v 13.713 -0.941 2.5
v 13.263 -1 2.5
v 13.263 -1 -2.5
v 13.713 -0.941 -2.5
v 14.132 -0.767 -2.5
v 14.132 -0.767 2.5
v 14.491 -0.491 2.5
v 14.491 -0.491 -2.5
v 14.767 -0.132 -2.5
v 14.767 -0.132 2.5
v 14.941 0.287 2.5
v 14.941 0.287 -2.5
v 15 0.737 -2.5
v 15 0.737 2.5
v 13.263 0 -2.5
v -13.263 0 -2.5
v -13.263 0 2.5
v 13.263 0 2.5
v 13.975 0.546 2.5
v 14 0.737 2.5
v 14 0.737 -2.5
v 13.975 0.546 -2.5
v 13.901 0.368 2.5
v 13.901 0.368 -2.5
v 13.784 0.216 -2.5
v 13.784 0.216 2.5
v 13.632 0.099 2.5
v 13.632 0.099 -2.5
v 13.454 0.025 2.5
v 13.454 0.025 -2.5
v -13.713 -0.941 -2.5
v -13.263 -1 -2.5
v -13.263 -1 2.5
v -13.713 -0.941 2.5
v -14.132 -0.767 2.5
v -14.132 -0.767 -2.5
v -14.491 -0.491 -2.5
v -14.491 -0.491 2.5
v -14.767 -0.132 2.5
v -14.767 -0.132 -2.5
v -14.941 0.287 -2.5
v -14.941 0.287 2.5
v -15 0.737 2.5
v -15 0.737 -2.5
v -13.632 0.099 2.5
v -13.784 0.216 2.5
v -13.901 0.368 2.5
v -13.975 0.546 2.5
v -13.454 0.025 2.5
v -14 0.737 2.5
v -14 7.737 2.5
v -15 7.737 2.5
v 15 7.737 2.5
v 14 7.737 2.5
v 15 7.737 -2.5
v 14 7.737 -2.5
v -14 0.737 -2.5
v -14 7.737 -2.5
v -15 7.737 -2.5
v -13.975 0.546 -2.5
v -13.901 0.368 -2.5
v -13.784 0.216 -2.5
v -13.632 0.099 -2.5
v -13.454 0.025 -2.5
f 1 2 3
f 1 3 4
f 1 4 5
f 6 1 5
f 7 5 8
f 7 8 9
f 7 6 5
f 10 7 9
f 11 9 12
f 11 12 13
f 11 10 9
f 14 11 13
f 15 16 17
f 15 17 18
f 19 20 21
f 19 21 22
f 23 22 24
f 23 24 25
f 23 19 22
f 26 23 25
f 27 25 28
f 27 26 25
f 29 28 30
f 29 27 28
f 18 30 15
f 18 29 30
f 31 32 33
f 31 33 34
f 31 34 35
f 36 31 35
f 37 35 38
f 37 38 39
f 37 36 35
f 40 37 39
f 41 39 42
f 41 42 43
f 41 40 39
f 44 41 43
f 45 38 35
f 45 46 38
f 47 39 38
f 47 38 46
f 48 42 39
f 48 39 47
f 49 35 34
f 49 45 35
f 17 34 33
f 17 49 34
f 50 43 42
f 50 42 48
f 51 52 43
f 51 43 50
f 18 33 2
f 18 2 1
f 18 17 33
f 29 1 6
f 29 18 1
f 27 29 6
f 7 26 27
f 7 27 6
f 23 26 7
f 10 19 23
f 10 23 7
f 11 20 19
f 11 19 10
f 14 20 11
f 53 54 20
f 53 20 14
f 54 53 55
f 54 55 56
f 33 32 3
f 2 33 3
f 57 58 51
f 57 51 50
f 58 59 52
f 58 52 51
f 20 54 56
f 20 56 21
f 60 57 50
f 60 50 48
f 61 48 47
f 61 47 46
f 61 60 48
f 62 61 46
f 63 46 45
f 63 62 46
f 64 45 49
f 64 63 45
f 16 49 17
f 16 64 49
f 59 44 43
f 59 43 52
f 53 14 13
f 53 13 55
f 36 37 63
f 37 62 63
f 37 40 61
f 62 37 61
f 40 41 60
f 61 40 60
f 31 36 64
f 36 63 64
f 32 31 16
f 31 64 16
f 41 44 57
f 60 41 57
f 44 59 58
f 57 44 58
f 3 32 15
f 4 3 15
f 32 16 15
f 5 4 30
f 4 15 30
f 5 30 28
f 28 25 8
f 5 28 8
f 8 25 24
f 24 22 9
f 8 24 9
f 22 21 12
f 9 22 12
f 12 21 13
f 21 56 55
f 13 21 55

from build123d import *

# Parameters (mm, degrees)
SKETCH1_W                    = 30
SKETCH1_H                    = 5
BASE_FLANGE1_DEPTH           = 1
EDGE_FLANGE1_STRIP_W         = 5.4732
EDGE_FLANGE1_STRIP_H         = 1
EDGE_FLANGE1_STRIP_CUT_DEPTH = 5
EDGE_FLANGE1_DEPTH           = 5
EDGE_FLANGE2_STRIP_W         = 5.4732
EDGE_FLANGE2_STRIP_H         = 1
EDGE_FLANGE2_STRIP_CUT_DEPTH = 5
EDGE_FLANGE2_DEPTH           = 5


# Sheet-metal steps are written as plain solids
with BuildPart() as part:
    # Sketch1 → Base-Flange1 (new body)
    with BuildSketch(Plane(origin=(0, 0, 0), x_dir=(1, 0, 0), z_dir=(0, 1, 0))):
        Rectangle(SKETCH1_W, SKETCH1_H)
    extrude(amount=-BASE_FLANGE1_DEPTH)

    # Edge-Flange1 strip (across the edge) → Edge-Flange1 strip cut (cut)
    with BuildSketch(Plane(origin=(-15, 0, -2.5), x_dir=(1, 0, 0), z_dir=(0, 0, 1))):
        with Locations((-1, -0.5)):
            Rectangle(EDGE_FLANGE1_STRIP_W, EDGE_FLANGE1_STRIP_H)
    extrude(amount=EDGE_FLANGE1_STRIP_CUT_DEPTH, mode=Mode.SUBTRACT)

    # Edge-Flange1 section (across the edge) → Edge-Flange1 (add)
    with BuildSketch(Plane(origin=(-15, 0, -2.5), x_dir=(1, 0, 0), z_dir=(0, 0, 1))):
        with BuildLine():
            Line((0, 0.7366), (0, 7.7366))
            Line((0, 7.7366), (1, 7.7366))
            Line((1, 7.7366), (1, 0.7366))
            ThreePointArc((1, 0.7366), (1.215745145, 0.215745145), (1.7366, 0))
            Line((1.7366, 0), (1.7366, -1))
            ThreePointArc((1.7366, -1), (0.508638364, -0.491361636), (0, 0.7366))
        make_face()
    extrude(amount=EDGE_FLANGE1_DEPTH)

    # Edge-Flange2 strip (across the edge) → Edge-Flange2 strip cut (cut)
    with BuildSketch(Plane(origin=(15, 0, 2.5), x_dir=(-1, 0, 0), z_dir=(0, 0, -1))):
        with Locations((-1, -0.5)):
            Rectangle(EDGE_FLANGE2_STRIP_W, EDGE_FLANGE2_STRIP_H)
    extrude(amount=EDGE_FLANGE2_STRIP_CUT_DEPTH, mode=Mode.SUBTRACT)

    # Edge-Flange2 section (across the edge) → Edge-Flange2 (add)
    with BuildSketch(Plane(origin=(15, 0, 2.5), x_dir=(-1, 0, 0), z_dir=(0, 0, -1))):
        with BuildLine():
            Line((0, 0.7366), (0, 7.7366))
            Line((0, 7.7366), (1, 7.7366))
            Line((1, 7.7366), (1, 0.7366))
            ThreePointArc((1, 0.7366), (1.215745145, 0.215745145), (1.7366, 0))
            Line((1.7366, 0), (1.7366, -1))
            ThreePointArc((1.7366, -1), (0.508638364, -0.491361636), (0, 0.7366))
        make_face()
    extrude(amount=EDGE_FLANGE2_DEPTH)


solid = part.part
